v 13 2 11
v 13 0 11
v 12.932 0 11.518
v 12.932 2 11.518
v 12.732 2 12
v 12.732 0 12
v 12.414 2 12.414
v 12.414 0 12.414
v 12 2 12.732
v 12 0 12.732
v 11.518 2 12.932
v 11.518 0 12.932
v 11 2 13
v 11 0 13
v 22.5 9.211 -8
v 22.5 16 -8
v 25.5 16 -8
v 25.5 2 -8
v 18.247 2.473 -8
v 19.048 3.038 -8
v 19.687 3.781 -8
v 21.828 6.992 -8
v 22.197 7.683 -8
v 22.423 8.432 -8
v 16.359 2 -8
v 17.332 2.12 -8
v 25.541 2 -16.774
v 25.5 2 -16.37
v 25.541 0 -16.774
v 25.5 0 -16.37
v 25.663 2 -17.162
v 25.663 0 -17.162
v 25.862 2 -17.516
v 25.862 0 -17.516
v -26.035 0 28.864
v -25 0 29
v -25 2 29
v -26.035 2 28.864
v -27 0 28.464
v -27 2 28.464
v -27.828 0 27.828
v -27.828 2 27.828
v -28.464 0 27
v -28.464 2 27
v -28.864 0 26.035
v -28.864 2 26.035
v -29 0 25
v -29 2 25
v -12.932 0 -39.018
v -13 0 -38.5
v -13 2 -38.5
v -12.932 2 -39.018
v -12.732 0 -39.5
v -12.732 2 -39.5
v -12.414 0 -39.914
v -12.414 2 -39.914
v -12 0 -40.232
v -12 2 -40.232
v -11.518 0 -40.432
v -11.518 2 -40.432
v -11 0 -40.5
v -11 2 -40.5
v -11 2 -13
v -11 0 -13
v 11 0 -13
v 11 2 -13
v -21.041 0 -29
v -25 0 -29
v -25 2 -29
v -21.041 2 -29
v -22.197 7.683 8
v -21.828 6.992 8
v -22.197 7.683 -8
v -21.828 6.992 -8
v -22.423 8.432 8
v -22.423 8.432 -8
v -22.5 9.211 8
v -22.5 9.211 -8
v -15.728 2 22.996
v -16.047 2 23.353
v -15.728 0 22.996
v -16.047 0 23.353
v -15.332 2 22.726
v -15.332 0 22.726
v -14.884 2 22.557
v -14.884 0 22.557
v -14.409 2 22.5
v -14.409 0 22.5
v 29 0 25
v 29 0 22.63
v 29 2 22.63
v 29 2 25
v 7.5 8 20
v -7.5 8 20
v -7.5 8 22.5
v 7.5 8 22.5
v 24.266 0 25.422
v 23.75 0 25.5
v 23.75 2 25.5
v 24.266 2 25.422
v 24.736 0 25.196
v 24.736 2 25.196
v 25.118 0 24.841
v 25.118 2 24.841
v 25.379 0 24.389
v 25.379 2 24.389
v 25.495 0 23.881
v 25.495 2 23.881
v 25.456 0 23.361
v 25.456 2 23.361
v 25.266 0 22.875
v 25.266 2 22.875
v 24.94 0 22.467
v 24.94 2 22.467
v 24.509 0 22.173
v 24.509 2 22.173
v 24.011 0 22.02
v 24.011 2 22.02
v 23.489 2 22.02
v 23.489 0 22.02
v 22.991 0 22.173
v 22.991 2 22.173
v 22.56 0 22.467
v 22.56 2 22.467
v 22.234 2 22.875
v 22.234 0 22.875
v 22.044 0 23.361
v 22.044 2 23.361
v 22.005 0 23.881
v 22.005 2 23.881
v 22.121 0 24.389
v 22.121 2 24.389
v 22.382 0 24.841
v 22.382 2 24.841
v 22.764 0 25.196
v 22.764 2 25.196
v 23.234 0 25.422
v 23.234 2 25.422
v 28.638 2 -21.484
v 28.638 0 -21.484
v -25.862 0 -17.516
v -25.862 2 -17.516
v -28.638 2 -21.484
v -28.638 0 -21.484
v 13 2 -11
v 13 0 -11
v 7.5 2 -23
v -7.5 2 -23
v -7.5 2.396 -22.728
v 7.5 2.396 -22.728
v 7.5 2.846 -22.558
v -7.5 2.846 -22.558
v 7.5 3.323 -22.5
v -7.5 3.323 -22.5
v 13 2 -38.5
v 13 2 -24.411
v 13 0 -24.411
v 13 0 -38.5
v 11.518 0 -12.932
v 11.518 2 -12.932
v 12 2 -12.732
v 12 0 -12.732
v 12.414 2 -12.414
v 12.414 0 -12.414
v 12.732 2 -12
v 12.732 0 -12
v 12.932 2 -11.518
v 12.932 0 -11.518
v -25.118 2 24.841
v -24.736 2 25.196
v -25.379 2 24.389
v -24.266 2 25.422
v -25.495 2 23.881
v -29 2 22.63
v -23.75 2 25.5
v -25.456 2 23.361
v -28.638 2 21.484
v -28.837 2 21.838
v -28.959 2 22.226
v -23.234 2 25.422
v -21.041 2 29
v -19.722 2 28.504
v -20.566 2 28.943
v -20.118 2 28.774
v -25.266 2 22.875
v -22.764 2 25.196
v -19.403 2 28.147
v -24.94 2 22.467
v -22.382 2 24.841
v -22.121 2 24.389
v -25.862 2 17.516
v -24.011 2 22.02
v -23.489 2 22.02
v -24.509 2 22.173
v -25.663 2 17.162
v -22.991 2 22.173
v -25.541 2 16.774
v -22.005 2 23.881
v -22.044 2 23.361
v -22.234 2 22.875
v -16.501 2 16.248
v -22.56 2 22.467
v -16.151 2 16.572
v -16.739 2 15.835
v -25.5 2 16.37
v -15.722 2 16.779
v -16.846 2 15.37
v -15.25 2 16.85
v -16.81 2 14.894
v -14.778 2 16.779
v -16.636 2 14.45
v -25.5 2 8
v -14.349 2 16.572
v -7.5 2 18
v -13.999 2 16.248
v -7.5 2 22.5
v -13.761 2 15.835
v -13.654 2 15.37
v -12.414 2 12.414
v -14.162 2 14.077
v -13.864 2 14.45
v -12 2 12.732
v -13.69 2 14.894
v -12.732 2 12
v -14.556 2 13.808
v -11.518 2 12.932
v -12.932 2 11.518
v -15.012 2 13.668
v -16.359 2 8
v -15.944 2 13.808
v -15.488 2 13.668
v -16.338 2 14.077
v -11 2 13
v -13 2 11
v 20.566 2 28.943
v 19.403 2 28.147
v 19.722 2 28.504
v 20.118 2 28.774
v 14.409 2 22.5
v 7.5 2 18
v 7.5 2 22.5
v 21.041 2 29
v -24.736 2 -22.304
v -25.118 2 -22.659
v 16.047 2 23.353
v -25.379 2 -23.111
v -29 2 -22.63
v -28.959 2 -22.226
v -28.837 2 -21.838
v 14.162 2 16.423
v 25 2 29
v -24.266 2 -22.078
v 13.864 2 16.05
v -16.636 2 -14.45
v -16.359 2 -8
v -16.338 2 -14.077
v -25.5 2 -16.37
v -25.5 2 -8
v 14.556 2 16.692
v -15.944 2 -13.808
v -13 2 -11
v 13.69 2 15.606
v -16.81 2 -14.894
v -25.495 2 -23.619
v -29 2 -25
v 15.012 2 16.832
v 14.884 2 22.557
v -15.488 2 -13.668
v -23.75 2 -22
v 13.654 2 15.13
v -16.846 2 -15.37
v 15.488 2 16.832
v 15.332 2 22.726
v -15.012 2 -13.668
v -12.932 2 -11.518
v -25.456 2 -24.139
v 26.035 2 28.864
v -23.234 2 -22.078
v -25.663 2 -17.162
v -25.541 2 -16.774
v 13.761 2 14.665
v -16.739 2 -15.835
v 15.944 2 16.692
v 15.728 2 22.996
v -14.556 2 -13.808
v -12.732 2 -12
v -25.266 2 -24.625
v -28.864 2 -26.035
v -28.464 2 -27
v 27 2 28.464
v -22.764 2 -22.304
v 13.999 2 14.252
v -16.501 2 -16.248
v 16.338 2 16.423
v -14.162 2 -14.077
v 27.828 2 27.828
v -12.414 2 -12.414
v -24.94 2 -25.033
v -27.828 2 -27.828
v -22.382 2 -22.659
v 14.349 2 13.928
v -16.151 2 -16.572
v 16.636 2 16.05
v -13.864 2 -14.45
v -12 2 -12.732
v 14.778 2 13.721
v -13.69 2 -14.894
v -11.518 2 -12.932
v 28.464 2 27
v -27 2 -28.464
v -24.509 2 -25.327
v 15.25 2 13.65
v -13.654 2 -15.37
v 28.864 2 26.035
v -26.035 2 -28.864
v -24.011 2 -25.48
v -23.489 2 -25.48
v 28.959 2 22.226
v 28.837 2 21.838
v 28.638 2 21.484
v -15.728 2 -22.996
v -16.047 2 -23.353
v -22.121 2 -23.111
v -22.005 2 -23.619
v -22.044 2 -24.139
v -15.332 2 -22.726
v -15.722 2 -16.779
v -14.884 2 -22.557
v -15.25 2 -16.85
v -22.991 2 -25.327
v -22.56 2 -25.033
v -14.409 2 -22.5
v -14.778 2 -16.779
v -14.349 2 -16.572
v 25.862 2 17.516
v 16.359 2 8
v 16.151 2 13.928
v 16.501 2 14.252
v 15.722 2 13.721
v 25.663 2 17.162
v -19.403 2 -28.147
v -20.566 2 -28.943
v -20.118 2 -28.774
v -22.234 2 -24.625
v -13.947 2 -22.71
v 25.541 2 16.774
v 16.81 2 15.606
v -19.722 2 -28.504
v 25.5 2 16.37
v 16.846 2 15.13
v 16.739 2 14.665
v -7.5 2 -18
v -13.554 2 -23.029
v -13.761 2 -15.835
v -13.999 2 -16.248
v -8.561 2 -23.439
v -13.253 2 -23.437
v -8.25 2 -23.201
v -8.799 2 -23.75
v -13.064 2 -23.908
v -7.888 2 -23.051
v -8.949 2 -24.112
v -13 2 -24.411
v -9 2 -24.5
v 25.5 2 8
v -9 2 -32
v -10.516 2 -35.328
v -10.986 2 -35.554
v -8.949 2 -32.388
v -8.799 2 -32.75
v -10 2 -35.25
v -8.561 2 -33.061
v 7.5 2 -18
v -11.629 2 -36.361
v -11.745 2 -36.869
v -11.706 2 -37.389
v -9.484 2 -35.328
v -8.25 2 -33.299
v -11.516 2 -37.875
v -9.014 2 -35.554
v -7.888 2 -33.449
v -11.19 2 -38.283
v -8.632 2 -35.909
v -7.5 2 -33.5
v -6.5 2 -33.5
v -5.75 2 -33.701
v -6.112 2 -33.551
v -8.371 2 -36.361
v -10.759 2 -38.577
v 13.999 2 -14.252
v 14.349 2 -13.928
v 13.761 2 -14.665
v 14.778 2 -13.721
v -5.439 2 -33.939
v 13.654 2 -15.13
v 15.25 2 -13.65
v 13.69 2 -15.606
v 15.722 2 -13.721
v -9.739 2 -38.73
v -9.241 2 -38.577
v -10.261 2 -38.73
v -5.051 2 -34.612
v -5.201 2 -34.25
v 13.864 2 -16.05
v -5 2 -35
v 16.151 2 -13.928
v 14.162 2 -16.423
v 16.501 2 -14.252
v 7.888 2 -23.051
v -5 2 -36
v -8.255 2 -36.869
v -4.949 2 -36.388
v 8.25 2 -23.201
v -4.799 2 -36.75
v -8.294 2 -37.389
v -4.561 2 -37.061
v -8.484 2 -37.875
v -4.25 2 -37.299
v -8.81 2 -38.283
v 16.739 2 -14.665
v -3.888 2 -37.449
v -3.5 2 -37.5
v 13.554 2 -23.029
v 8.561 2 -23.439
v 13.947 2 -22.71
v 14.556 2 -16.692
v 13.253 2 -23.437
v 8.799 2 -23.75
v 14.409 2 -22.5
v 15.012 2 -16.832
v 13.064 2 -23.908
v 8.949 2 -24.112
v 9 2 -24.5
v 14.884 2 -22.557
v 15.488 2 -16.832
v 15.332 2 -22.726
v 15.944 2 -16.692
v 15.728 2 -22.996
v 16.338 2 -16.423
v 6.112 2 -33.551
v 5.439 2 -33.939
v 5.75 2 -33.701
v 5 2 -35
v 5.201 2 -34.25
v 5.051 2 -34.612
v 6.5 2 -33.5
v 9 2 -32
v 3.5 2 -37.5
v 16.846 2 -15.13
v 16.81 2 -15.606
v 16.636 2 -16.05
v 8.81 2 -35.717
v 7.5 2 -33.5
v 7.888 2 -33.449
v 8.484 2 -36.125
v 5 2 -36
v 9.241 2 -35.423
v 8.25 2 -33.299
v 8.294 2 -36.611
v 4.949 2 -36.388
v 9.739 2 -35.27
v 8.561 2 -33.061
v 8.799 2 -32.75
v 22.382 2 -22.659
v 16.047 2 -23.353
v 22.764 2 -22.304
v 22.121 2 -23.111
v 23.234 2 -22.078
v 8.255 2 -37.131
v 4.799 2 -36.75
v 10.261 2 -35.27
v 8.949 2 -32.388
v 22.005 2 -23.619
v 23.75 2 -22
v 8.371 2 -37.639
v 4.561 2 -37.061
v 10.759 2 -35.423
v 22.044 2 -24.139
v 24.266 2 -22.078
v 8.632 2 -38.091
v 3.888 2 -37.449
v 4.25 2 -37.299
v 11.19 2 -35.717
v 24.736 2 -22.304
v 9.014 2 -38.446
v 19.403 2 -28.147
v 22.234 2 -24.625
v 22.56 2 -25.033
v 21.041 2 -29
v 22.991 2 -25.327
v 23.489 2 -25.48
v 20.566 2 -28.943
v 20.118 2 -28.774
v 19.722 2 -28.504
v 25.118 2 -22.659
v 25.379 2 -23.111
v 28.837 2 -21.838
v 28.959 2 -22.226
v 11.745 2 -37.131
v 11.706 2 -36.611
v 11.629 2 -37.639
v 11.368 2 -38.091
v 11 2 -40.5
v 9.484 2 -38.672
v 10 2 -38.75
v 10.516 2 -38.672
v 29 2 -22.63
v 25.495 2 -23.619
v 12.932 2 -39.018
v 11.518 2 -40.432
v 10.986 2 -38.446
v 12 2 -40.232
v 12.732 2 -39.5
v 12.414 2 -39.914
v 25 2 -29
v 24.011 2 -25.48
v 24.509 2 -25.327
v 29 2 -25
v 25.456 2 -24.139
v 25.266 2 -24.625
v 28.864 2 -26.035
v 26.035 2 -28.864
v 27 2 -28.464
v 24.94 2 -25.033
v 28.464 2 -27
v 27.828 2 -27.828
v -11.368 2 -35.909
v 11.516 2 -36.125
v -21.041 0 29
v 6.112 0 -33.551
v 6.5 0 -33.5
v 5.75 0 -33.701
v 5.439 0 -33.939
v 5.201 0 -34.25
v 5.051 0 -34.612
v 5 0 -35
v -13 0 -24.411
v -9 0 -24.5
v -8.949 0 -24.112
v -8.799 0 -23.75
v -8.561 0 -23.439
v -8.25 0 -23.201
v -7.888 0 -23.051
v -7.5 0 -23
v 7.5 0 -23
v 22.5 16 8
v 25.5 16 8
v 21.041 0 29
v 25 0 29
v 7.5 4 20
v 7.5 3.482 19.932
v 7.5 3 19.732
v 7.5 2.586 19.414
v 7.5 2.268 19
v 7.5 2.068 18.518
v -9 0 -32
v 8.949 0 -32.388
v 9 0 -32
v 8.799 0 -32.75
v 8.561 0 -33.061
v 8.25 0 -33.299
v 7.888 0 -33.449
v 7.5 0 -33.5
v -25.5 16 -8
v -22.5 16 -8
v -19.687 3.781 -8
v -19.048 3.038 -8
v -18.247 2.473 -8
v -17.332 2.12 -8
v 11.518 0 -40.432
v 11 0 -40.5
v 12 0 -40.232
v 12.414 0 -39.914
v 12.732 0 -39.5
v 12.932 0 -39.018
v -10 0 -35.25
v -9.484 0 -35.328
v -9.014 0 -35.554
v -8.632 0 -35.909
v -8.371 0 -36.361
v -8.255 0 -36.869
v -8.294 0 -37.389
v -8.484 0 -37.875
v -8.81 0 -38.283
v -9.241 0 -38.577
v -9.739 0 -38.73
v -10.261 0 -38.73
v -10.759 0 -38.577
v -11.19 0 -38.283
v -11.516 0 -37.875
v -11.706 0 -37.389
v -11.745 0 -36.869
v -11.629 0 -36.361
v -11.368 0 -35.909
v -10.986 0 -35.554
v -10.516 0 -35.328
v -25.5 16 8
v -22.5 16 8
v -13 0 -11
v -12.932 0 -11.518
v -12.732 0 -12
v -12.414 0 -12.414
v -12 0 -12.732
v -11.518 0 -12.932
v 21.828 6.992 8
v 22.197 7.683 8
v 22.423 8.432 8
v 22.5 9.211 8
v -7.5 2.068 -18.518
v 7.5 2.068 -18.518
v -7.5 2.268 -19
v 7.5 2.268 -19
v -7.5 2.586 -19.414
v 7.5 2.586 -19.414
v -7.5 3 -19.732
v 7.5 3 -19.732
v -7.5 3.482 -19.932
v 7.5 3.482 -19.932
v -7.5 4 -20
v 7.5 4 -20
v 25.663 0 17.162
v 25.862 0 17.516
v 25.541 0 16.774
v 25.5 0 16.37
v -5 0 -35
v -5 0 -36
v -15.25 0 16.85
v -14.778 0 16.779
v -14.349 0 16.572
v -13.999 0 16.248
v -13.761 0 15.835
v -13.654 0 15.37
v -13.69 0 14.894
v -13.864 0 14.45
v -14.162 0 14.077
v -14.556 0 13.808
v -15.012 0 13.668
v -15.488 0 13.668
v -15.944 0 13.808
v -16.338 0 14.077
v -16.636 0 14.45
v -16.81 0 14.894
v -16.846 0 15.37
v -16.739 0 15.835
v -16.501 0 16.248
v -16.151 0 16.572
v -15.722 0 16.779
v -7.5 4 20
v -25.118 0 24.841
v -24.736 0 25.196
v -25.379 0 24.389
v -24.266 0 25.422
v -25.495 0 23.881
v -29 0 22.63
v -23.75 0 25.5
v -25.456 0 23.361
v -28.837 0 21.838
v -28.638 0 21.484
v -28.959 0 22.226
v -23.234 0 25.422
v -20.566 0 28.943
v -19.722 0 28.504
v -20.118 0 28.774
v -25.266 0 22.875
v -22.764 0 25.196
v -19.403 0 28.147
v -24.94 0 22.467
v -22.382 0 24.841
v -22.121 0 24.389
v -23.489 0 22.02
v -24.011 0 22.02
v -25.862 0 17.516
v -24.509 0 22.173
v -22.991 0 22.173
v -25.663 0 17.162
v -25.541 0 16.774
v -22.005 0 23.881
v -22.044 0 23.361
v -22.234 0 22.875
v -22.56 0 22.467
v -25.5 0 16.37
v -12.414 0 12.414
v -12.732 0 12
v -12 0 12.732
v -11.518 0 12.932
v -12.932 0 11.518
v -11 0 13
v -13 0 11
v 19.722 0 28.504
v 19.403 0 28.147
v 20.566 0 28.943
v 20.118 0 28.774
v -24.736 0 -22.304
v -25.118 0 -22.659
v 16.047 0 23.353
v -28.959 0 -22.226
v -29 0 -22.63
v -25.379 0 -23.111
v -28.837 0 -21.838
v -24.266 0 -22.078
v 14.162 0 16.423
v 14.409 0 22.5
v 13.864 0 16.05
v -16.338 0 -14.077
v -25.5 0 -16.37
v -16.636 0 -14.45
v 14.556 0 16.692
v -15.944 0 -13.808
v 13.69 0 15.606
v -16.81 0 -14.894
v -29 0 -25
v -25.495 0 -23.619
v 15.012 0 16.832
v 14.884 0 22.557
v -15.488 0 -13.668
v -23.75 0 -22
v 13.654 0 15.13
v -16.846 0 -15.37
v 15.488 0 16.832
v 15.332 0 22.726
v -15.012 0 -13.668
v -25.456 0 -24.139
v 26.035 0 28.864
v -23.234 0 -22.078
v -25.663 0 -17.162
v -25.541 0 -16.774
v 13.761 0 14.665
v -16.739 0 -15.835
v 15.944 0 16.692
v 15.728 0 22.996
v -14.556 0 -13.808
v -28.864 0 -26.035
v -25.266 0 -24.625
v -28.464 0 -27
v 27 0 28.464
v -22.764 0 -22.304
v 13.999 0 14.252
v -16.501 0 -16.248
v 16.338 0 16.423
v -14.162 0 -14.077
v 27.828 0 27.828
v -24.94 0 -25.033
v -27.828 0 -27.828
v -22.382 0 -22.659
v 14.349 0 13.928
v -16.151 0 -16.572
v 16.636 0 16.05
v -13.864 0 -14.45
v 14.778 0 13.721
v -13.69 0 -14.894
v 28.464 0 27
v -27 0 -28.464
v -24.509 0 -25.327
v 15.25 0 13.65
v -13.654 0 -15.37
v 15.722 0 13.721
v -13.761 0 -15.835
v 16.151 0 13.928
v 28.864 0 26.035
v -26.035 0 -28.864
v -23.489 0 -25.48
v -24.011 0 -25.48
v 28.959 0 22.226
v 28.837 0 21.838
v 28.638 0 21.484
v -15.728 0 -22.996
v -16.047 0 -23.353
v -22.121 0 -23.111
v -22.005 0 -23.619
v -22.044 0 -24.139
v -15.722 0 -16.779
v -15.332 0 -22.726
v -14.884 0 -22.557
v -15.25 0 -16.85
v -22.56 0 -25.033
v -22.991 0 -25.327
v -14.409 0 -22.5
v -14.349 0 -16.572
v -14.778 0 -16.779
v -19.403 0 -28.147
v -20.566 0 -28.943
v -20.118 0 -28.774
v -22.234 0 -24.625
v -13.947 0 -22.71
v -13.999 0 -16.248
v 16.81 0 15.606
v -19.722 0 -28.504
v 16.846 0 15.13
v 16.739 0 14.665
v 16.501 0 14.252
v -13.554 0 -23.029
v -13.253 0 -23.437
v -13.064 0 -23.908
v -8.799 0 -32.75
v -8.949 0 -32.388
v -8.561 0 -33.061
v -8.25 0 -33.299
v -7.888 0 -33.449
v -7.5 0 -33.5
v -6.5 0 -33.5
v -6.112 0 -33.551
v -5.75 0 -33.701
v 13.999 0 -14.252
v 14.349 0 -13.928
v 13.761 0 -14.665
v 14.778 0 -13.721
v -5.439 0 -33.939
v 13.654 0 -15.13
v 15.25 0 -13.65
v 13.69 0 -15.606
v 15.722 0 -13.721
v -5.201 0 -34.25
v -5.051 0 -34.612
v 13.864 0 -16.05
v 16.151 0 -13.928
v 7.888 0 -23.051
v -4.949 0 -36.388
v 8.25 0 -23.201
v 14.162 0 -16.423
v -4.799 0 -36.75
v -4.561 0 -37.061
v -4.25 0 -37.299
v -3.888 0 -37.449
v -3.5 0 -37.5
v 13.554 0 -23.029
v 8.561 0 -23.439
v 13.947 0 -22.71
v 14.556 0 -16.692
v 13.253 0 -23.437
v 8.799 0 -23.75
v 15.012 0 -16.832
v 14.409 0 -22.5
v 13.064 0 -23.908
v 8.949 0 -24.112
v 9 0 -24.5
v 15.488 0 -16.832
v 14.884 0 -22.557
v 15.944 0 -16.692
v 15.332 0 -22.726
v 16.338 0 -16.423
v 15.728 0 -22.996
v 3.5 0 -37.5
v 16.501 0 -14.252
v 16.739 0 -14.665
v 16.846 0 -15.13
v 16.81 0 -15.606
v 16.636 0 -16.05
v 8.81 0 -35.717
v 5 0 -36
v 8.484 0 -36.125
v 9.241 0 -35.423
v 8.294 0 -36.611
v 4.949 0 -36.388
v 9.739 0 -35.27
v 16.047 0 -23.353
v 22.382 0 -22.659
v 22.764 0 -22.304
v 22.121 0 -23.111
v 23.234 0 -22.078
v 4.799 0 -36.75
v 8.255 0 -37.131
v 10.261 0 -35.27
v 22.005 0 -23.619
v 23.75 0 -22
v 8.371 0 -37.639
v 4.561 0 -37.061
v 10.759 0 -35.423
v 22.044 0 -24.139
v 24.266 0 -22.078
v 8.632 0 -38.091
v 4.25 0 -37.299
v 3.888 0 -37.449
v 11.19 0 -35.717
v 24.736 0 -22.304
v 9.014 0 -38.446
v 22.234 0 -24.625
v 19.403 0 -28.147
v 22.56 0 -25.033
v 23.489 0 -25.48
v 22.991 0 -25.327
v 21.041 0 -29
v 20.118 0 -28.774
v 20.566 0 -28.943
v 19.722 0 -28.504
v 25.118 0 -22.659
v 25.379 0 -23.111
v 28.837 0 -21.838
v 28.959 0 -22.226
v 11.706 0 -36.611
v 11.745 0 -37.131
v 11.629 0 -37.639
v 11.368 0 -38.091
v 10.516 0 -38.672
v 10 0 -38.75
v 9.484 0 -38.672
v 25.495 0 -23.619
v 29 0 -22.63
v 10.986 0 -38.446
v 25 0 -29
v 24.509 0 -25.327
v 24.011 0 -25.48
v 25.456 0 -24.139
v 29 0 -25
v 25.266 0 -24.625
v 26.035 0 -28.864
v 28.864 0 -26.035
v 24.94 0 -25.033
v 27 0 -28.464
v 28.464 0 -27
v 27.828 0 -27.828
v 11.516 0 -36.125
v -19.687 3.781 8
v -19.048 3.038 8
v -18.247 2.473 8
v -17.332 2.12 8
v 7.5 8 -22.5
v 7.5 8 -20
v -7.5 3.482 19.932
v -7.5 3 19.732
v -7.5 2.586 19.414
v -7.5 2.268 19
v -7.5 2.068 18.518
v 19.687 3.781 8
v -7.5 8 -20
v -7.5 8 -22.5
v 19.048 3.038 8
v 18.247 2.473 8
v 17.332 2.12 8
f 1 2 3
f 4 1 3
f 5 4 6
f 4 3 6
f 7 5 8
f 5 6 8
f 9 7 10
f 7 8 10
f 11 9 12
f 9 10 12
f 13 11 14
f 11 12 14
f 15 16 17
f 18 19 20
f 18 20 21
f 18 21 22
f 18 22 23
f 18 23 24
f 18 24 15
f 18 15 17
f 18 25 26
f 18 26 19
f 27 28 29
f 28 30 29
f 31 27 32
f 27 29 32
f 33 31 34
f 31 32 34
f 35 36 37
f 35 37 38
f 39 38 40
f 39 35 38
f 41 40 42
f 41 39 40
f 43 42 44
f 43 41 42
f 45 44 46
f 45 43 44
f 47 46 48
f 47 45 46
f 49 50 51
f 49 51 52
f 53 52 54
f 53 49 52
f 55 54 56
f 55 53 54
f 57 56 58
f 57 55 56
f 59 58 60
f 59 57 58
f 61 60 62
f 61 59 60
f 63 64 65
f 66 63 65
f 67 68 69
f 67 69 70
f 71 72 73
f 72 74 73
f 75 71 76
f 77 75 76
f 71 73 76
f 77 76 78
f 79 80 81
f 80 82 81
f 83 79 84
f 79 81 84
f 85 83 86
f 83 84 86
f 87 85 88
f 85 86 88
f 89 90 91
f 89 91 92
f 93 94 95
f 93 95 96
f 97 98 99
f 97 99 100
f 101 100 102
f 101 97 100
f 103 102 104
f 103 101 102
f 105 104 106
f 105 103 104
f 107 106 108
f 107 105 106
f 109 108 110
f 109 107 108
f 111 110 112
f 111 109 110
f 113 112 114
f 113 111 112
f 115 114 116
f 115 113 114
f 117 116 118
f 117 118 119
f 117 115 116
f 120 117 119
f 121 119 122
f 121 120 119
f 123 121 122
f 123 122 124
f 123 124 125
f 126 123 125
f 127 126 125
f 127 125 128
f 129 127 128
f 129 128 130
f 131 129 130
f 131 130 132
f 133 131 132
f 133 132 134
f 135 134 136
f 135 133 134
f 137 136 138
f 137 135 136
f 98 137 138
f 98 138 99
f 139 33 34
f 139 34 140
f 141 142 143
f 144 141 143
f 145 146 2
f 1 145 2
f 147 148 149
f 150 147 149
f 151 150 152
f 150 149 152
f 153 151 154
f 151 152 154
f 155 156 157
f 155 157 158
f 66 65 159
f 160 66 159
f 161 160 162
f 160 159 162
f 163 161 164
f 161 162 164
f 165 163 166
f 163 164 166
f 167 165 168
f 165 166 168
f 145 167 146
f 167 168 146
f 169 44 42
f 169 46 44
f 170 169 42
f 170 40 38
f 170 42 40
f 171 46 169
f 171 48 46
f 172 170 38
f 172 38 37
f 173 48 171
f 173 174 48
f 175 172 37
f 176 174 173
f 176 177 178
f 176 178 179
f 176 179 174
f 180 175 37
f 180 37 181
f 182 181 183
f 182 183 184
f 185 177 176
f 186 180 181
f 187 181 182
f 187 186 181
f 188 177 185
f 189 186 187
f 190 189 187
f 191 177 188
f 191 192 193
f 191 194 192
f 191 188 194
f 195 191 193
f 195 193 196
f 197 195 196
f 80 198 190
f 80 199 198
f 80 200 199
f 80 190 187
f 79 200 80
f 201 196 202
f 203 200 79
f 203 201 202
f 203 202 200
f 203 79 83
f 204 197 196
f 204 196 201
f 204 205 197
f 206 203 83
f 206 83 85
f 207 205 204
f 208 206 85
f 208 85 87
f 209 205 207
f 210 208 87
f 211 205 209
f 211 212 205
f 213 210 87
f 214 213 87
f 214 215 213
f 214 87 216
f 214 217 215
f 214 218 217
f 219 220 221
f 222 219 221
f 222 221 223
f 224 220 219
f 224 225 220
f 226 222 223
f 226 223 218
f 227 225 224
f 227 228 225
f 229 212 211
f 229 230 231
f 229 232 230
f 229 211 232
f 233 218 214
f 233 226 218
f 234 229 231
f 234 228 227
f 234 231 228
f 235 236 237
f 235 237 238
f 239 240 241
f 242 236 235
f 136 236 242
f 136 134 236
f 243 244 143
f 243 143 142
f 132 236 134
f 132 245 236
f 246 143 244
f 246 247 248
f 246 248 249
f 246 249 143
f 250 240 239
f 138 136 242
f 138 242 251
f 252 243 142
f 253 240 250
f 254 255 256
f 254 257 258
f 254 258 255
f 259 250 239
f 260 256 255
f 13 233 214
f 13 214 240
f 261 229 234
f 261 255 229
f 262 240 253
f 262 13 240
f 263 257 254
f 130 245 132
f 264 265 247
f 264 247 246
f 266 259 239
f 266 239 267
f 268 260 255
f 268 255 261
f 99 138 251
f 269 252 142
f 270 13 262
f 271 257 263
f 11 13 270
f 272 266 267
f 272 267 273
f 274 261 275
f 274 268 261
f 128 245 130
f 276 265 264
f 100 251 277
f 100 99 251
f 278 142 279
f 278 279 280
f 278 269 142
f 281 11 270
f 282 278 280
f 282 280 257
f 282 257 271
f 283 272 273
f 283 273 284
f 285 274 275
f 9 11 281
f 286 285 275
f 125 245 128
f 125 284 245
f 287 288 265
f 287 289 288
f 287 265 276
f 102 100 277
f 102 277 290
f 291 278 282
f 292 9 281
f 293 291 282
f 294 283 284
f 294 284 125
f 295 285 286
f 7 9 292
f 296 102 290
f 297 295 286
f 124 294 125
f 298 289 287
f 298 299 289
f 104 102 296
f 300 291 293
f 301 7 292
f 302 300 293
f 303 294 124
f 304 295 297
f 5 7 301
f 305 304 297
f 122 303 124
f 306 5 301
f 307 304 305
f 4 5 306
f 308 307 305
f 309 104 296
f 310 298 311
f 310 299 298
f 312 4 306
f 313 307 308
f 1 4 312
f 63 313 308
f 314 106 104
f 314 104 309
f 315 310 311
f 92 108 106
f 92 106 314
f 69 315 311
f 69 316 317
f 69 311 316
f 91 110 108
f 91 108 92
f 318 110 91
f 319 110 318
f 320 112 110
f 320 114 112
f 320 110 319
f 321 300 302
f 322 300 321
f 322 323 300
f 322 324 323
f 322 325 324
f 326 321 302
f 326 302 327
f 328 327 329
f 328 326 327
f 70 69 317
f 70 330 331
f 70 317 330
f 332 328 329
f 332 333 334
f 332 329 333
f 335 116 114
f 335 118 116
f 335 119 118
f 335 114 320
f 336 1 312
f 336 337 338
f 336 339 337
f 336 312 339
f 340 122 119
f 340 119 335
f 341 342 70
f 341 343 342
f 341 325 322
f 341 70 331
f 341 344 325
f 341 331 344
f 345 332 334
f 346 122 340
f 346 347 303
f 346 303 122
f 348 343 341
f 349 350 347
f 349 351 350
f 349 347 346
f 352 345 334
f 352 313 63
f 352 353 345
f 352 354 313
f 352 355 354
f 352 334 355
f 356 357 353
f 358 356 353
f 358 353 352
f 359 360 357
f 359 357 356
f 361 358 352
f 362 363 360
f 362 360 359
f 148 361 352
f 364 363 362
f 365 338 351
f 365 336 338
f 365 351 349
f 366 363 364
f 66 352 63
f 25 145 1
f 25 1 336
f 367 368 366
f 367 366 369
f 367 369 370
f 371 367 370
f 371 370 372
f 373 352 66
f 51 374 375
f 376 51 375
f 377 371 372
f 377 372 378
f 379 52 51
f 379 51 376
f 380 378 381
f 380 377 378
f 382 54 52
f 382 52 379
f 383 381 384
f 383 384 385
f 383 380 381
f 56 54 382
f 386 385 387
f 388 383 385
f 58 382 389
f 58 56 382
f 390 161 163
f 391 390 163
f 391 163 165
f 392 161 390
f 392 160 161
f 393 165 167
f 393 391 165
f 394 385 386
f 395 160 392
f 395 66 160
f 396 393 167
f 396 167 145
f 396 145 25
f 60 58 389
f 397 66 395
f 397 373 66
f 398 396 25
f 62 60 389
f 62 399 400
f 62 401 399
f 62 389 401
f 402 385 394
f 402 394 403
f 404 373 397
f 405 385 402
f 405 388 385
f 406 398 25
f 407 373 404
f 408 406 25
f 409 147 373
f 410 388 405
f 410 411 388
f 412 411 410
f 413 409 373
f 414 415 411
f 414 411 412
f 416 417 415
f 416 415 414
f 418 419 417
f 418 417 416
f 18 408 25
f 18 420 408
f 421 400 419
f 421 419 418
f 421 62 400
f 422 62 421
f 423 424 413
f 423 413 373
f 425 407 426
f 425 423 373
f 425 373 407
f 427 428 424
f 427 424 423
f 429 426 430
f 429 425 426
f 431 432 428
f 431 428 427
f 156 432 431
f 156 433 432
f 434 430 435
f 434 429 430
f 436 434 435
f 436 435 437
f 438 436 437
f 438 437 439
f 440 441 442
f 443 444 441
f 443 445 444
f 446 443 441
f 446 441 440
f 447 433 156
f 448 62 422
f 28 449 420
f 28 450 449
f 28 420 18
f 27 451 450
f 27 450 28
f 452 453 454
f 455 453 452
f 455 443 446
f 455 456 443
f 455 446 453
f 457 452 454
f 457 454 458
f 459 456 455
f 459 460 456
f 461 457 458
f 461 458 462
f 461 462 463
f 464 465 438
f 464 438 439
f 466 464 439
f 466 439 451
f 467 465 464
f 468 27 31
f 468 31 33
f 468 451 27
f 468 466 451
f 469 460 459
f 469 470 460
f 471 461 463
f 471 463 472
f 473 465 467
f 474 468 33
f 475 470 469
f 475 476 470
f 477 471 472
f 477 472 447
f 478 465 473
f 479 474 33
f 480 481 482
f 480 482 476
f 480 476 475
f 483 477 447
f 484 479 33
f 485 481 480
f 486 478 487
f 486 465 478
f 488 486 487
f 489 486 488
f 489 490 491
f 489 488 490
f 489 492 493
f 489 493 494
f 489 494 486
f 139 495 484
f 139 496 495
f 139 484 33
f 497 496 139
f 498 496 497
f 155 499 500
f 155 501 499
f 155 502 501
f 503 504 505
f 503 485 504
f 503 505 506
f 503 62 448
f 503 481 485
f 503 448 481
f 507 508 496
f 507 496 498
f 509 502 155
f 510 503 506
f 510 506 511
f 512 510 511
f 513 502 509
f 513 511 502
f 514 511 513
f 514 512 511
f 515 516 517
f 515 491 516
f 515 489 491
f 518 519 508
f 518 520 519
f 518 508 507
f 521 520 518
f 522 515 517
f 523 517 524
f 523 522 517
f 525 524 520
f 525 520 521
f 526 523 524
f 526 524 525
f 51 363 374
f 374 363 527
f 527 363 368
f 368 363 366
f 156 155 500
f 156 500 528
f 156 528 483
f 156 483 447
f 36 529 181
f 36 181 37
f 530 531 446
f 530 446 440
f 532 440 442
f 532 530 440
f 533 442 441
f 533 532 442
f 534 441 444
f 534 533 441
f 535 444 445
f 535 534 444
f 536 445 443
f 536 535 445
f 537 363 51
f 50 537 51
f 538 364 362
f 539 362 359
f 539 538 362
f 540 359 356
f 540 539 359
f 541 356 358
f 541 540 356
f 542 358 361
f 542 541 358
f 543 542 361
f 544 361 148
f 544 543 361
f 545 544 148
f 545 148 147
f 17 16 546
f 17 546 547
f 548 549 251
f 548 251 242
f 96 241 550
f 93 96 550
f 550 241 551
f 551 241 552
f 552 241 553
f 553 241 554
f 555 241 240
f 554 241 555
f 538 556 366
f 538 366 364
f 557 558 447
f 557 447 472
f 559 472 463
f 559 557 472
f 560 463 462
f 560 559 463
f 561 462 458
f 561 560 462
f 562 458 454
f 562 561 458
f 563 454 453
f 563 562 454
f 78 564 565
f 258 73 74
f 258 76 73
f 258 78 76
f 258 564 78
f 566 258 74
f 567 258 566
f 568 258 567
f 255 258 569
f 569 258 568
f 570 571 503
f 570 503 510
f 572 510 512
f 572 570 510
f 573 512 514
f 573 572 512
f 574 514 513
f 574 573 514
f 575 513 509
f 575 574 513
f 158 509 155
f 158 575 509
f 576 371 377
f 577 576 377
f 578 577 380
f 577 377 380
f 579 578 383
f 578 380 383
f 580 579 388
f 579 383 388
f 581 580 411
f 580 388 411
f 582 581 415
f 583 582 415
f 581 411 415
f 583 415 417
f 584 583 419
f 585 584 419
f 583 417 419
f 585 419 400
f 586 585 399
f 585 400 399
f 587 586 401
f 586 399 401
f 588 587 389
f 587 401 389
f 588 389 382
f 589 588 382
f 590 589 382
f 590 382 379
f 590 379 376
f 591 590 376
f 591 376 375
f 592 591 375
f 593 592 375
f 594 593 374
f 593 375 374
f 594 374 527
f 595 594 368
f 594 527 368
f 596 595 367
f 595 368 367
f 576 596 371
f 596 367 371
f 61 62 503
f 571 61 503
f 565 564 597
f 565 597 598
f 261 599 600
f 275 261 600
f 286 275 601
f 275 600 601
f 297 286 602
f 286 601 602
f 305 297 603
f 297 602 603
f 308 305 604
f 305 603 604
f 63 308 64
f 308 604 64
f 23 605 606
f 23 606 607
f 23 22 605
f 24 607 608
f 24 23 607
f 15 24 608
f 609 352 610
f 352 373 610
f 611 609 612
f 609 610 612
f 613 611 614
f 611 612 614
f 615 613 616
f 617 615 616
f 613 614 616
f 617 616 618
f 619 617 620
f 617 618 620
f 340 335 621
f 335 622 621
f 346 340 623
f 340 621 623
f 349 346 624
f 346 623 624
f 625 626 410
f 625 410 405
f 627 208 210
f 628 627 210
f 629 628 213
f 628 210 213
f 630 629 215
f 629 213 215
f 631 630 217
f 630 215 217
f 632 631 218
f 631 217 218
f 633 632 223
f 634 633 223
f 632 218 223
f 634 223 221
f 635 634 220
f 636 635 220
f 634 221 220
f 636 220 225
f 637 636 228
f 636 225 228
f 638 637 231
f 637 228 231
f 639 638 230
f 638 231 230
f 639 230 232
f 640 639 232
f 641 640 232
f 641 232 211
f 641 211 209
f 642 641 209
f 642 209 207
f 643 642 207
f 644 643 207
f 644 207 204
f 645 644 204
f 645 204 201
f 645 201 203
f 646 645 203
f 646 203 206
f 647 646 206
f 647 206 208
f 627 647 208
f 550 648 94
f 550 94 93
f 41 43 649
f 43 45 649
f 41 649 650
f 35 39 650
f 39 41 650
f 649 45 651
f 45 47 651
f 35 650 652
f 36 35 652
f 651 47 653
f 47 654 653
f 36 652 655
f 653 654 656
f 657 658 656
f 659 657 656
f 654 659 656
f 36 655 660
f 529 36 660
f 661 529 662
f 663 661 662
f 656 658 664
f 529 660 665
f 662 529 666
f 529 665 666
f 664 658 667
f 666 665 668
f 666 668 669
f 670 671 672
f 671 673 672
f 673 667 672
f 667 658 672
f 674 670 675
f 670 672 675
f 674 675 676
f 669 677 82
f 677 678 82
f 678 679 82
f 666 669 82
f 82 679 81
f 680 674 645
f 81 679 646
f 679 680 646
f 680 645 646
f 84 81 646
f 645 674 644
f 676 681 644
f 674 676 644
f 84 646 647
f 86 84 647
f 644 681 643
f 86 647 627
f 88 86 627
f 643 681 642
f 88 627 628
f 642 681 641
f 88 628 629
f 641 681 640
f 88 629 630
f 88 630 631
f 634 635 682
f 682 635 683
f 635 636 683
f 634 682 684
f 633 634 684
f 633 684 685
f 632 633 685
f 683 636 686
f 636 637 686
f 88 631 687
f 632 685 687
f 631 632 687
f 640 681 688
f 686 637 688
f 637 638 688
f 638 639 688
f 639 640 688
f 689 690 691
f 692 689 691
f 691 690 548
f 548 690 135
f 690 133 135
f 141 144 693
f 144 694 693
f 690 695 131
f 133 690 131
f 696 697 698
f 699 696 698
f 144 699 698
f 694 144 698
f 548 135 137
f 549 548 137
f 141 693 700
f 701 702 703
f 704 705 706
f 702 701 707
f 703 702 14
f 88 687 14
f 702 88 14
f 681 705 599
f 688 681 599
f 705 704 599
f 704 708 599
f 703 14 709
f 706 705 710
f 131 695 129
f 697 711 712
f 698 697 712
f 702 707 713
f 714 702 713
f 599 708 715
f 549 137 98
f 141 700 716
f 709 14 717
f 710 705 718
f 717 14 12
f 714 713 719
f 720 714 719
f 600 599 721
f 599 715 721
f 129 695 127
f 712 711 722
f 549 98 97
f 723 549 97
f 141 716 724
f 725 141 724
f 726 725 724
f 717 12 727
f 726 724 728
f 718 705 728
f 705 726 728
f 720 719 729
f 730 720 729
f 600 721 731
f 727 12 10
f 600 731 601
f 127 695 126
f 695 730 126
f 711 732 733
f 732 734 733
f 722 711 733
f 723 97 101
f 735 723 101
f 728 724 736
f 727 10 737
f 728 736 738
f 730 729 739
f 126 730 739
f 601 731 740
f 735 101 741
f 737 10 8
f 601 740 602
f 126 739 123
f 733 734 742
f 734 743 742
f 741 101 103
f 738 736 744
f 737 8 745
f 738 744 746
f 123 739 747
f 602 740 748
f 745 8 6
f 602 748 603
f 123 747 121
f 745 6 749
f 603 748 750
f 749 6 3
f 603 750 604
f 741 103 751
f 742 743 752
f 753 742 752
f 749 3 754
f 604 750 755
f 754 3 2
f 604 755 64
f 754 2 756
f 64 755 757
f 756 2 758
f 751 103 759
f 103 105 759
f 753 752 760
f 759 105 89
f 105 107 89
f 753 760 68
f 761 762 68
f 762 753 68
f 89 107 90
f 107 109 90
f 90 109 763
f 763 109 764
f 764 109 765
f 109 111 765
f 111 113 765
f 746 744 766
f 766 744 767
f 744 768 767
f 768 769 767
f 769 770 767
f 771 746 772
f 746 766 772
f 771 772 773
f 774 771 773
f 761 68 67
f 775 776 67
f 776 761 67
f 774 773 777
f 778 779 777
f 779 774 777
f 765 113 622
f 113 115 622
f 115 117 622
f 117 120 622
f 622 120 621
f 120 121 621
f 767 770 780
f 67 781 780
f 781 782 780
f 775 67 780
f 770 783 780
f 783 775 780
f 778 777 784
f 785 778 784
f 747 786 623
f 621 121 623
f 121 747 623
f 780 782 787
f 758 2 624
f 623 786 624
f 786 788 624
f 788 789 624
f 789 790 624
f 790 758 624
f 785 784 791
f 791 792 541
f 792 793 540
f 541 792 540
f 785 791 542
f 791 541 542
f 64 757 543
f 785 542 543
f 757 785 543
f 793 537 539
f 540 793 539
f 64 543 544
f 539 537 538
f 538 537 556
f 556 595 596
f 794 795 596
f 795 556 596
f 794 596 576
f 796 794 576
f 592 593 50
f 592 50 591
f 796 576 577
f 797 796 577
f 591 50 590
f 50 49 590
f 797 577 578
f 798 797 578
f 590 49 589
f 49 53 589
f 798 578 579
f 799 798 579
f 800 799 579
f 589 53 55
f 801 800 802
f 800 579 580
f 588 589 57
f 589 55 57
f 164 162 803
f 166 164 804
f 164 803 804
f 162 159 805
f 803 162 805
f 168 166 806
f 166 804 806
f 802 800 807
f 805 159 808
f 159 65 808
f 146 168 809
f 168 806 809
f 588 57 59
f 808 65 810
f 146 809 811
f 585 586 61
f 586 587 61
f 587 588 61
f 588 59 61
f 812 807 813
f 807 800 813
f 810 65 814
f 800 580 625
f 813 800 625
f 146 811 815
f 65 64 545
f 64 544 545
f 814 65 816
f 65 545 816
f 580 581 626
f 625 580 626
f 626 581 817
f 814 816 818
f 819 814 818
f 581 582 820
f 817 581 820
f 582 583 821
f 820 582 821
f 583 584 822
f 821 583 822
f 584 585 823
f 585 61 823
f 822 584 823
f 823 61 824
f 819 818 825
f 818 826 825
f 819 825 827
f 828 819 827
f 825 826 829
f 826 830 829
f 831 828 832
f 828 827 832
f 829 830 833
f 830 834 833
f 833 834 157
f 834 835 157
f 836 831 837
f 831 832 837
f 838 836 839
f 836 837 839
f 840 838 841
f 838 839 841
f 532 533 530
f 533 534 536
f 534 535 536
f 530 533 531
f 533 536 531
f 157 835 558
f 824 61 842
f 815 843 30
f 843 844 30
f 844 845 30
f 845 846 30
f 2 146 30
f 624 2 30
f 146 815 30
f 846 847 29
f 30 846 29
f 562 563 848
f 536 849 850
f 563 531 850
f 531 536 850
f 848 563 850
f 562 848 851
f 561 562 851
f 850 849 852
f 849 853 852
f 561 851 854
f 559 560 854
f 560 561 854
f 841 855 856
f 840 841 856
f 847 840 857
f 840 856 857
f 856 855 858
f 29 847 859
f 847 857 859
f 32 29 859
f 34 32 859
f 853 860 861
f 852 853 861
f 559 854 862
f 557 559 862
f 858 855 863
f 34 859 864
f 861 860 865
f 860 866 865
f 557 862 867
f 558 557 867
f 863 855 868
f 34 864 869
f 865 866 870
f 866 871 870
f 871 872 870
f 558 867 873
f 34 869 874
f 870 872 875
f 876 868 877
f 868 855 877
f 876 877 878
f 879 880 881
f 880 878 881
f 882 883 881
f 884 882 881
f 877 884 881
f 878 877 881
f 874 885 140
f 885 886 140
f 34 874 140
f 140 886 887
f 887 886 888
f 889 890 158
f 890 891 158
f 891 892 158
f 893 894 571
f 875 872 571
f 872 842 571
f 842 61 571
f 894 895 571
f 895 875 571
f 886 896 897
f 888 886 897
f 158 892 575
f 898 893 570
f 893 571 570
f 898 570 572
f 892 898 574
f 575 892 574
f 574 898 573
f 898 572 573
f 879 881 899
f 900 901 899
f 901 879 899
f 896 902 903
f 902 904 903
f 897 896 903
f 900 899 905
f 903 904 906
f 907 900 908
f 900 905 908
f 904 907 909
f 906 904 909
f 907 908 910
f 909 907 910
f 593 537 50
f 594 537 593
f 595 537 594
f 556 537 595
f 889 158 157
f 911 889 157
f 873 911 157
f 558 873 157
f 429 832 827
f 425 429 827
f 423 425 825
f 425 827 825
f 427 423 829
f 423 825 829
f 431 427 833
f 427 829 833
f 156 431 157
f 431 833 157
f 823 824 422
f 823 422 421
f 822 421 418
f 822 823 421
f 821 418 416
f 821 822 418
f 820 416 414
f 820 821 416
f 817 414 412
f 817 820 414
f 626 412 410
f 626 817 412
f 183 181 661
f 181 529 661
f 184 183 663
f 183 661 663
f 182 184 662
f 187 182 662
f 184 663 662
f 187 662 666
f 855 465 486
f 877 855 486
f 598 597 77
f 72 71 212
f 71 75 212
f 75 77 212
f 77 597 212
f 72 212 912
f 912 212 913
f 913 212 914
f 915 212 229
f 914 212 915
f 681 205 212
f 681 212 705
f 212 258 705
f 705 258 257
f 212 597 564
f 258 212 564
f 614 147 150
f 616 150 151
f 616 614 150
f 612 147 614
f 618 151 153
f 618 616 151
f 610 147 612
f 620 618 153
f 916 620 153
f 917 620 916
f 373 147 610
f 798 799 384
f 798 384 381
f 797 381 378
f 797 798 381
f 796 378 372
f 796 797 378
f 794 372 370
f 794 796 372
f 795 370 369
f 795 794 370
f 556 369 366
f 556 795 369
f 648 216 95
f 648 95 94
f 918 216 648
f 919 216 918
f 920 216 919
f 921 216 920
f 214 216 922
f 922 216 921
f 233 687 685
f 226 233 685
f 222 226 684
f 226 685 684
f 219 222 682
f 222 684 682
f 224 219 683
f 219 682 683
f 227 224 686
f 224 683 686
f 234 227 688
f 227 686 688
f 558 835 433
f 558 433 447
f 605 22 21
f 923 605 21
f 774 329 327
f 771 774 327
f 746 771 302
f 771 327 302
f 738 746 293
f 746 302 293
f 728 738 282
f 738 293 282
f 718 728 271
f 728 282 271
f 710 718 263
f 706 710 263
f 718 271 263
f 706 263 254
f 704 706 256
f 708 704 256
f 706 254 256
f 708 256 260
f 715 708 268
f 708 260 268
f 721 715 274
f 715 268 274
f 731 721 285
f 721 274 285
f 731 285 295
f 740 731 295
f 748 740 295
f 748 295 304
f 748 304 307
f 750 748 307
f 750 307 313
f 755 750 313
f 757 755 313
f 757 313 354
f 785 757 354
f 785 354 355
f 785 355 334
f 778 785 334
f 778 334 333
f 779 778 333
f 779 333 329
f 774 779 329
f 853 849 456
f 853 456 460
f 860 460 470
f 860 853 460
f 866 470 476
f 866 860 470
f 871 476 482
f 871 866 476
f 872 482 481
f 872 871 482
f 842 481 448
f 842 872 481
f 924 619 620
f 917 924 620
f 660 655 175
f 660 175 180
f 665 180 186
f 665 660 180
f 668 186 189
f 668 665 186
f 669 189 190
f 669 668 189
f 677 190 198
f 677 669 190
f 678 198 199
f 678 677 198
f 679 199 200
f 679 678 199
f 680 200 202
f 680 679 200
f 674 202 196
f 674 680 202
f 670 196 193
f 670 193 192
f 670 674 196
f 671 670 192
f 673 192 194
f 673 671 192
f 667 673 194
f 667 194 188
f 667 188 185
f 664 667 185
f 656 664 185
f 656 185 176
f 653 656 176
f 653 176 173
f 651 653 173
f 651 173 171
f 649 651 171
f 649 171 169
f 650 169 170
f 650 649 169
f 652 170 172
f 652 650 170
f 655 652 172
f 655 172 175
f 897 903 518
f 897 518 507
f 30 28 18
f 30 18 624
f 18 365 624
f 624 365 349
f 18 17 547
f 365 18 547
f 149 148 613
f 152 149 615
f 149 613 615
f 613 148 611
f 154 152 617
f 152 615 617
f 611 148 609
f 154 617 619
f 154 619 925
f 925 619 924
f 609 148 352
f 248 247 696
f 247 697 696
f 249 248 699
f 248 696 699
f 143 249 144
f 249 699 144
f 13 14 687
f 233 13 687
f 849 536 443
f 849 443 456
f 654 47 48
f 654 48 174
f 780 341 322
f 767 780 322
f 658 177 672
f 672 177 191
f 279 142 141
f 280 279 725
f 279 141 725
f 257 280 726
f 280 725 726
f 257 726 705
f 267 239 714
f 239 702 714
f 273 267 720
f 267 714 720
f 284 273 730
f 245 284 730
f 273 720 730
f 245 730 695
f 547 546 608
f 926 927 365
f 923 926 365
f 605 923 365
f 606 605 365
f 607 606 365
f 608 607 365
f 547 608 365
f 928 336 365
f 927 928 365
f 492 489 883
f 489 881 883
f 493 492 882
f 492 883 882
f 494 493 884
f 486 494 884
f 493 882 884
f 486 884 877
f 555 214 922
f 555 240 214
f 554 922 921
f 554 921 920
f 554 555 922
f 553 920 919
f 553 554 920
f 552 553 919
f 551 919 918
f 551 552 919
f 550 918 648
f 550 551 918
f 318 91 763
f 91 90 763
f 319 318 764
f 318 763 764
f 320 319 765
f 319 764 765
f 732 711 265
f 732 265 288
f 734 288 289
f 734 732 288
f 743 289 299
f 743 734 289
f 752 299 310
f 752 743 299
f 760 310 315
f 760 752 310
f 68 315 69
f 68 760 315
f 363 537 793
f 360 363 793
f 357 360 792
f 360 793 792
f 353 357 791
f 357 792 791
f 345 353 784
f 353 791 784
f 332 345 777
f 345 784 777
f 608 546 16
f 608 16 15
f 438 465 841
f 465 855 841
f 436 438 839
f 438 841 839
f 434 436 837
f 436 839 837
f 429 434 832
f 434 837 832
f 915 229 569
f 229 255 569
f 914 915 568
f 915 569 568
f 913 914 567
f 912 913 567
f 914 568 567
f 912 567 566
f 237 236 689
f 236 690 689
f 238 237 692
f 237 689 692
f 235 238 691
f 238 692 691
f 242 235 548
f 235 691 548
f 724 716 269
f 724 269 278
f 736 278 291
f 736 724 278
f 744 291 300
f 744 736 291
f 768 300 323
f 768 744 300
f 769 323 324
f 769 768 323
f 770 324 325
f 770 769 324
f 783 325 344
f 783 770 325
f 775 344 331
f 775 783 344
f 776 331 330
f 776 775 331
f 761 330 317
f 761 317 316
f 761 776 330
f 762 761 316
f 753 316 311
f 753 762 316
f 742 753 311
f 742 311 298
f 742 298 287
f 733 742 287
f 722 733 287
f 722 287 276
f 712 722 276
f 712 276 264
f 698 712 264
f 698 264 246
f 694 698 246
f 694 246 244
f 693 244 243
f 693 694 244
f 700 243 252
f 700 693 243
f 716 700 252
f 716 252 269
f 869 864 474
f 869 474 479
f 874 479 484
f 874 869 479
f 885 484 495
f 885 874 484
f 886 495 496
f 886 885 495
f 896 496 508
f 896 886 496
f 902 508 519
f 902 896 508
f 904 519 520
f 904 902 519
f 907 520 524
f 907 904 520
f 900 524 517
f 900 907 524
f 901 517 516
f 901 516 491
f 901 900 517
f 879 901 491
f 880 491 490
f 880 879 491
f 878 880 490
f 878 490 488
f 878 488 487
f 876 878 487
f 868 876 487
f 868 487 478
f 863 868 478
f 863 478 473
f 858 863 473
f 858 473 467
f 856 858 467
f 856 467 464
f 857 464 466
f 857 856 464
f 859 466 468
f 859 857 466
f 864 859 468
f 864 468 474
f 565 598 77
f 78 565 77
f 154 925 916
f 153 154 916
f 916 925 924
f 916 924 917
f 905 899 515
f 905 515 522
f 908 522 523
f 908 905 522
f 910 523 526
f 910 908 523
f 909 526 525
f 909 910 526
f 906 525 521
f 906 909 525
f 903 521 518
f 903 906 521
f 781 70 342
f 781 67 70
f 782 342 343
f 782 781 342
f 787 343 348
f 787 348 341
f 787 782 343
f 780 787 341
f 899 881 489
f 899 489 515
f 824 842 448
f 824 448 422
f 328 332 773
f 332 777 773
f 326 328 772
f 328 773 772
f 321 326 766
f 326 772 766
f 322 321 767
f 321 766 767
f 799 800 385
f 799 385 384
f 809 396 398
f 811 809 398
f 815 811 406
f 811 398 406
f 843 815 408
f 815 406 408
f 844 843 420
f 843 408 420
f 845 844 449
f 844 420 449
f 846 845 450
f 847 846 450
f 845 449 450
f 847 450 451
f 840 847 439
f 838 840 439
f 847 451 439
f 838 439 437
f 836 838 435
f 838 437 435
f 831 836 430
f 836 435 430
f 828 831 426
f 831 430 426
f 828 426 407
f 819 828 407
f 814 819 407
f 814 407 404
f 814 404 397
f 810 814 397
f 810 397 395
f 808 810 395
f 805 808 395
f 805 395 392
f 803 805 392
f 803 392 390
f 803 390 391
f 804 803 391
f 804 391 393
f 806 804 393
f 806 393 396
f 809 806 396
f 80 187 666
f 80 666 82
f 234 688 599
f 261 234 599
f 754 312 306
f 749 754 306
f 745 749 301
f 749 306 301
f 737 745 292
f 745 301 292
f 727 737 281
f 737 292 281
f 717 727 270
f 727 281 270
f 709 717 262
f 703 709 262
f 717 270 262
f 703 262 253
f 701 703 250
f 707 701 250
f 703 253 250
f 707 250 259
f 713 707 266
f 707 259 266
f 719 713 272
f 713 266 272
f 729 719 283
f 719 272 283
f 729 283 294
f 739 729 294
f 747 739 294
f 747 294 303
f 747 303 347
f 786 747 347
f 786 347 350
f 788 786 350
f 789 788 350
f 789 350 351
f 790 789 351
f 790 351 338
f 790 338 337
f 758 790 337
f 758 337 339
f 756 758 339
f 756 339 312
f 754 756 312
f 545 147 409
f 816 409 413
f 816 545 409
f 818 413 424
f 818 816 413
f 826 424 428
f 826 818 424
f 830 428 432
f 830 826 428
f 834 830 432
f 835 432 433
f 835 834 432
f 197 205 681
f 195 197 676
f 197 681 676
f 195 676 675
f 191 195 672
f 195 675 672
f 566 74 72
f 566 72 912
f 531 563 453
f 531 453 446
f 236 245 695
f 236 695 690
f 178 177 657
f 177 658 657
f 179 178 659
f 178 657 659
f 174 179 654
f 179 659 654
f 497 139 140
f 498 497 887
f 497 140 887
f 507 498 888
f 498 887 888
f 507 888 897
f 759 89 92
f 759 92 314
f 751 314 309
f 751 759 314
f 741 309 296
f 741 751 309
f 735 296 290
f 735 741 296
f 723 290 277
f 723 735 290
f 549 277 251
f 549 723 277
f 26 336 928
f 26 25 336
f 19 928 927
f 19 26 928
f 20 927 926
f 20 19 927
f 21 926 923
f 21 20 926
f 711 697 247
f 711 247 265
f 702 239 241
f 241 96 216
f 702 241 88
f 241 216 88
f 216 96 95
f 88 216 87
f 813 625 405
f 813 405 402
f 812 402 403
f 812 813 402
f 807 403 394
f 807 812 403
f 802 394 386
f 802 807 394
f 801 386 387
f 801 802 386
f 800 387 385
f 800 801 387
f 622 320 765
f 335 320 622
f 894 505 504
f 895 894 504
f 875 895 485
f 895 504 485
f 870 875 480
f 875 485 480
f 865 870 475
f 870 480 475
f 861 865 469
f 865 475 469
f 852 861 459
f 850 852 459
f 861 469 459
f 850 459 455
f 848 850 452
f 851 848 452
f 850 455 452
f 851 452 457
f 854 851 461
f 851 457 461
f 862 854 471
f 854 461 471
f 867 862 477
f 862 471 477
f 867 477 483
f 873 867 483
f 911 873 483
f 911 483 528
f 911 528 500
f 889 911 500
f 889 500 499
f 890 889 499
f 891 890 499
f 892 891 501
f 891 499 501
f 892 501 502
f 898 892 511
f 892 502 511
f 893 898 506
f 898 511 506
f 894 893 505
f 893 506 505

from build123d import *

# Parameters (mm, degrees)
SKETCH1_R                 = 1.75
BASE_DEPTH                = 2
SKETCH2_W                 = 7
SKETCH2_H                 = 16
SIDE_BATTERY_GUIDES_DEPTH = 14
CUT_EXTRUDE1_DEPTH        = 50.658836072
SKETCH5_W                 = 15
SKETCH5_H                 = 2.5
BOSS_EXTRUDE3_DEPTH       = 6
CUT_EXTRUDE2_DEPTH        = 44.33589736
FILLET2_R                 = 2
SKETCH7_R                 = 1.6
CUT_EXTRUDE3_DEPTH        = 44.33589736
SKETCH8_W                 = 26
SKETCH8_H                 = 18
SKETCH8_R                 = 1.75
PINOUT_BD_HOLDER_DEPTH    = 2
WEIGH_REDUCER_DEPTH       = 53.318734694
FILLET3_R                 = 4
FILLET4_R                 = 2
FILLET5_DEPTH             = 2
FILLET5_START             = -7.5
FILLET5_2_DEPTH           = 15
FILLET5_START_2           = -1
FILLET5_3_DEPTH           = 4


with BuildPart() as part:
    # Sketch1 → base (new body)
    with BuildSketch(Plane(origin=(0, 0, 0), x_dir=(1, 0, 0), z_dir=(0, 1, 0))):
        with BuildLine():
            Line((-25, 29), (25, 29))
            ThreePointArc((25, 29), (27.828427125, 27.828427125), (29, 25))
            Line((29, 25), (29, -25))
            ThreePointArc((29, -25), (27.828427125, -27.828427125), (25, -29))
            Line((25, -29), (-25, -29))
            ThreePointArc((-25, -29), (-27.828427125, -27.828427125), (-29, -25))
            Line((-29, -25), (-29, 25))
            ThreePointArc((-29, 25), (-27.828427125, 27.828427125), (-25, 29))
        make_face()
        with Locations(Location((23.75, 23.75, 0), (0, 0, 270))):
            Circle(SKETCH1_R, mode=Mode.SUBTRACT)
        with Locations(Location((23.75, -23.75, 0), (0, 0, 270))):
            Circle(SKETCH1_R, mode=Mode.SUBTRACT)
        with Locations(Location((-23.75, -23.75, 0), (0, 0, 270))):
            Circle(SKETCH1_R, mode=Mode.SUBTRACT)
        with Locations(Location((-23.75, 23.75, 0), (0, 0, 270))):
            Circle(SKETCH1_R, mode=Mode.SUBTRACT)
        with BuildLine():
            Line((-11, 13), (11, 13))
            ThreePointArc((11, 13), (12.414213562, 12.414213562), (13, 11))
            Line((13, 11), (13, -11))
            ThreePointArc((13, -11), (12.414213562, -12.414213562), (11, -13))
            Line((11, -13), (-11, -13))
            ThreePointArc((-11, -13), (-12.414213562, -12.414213562), (-13, -11))
            Line((-13, -11), (-13, 11))
            ThreePointArc((-13, 11), (-12.414213562, 12.414213562), (-11, 13))
        make_face(mode=Mode.SUBTRACT)
    extrude(amount=BASE_DEPTH)

    # Sketch2 → side battery guides (add)
    with BuildSketch(Plane(origin=(0, 2, 0), x_dir=(1, 0, 0), z_dir=(0, 1, 0))):
        with Locations((-22, 0)):
            Rectangle(SKETCH2_W, SKETCH2_H)
        with Locations((22, 0)):
            Rectangle(SKETCH2_W, SKETCH2_H)
    extrude(amount=SIDE_BATTERY_GUIDES_DEPTH)

    # Sketch4 → Cut-Extrude1 (cut, through all)
    with BuildSketch(Plane.XY.offset(8)):
        Polygon((-18.5, 16), (-22.5, 16), (-22.5, 8), (-18.5, 2), align=None)
        Polygon((18.5, 2), (18.5, 16), (22.5, 16), (22.5, 8), align=None)
    extrude(amount=-CUT_EXTRUDE1_DEPTH, mode=Mode.SUBTRACT)

    # Sketch5 → Boss-Extrude3 (add)
    with BuildSketch(Plane(origin=(0, 2, 0), x_dir=(1, 0, 0), z_dir=(0, 1, 0))):
        with Locations((0, 21.25)):
            Rectangle(SKETCH5_W, SKETCH5_H)
        with Locations((0, -21.25)):
            Rectangle(SKETCH5_W, SKETCH5_H)
    extrude(amount=BOSS_EXTRUDE3_DEPTH)

    # Sketch6 → Cut-Extrude2 (cut, through all)
    with BuildSketch(Plane(origin=(0, 2, 0), x_dir=(1, 0, 0), z_dir=(0, 1, 0))):
        Polygon((-25.5, 8), (-25.5, 17), (-29, 22), (-29, -22), (-25.5, -17), (-25.5, -8), align=None)
        Polygon((-15.45, -22.5), (-7.5, -22.5), (7.5, -22.5), (15.45, -22.5), (20, -29), (-20, -29), align=None)
        Polygon((29, 22), (29, -22), (25.5, -17), (25.5, -8), (25.5, 8), (25.5, 17), align=None)
        Polygon((-7.5, 22.5), (7.5, 22.5), (15.45, 22.5), (20, 29), (-20, 29), (-15.45, 22.5), align=None)
    extrude(amount=-CUT_EXTRUDE2_DEPTH, mode=Mode.SUBTRACT)

    # Fillet2
    fillet2_edges = [part.edges().sort_by_distance(p)[0] for p in [
        (-25.5, 1, -17),
        (-25.5, 1, 17),
        (-29, 1, 22),
        (-29, 1, -22),
        (-20, 1, 29),
        (-15.45, 1, 22.5),
        (15.45, 1, 22.5),
        (20, 1, 29),
        (25.5, 1, -17),
        (29, 1, -22),
        (29, 1, 22),
        (25.5, 1, 17),
        (-15.45, 1, -22.5),
        (-20, 1, -29),
        (20, 1, -29),
        (15.45, 1, -22.5),
    ]]
    fillet(fillet2_edges, radius=FILLET2_R)

    # Sketch7 → Cut-Extrude3 (cut, through all)
    with BuildSketch(Plane(origin=(0, 2, 0), x_dir=(1, 0, 0), z_dir=(0, 1, 0))):
        with Locations(Location((15.25, 15.25, 0), (0, 0, 270))):
            Circle(SKETCH7_R)
        with Locations(Location((15.25, -15.25, 0), (0, 0, 90))):
            Circle(SKETCH7_R)
        with Locations(Location((-15.25, -15.25, 0), (0, 0, 270))):
            Circle(SKETCH7_R)
        with Locations(Location((-15.25, 15.25, 0), (0, 0, 90))):
            Circle(SKETCH7_R)
    extrude(amount=-CUT_EXTRUDE3_DEPTH, mode=Mode.SUBTRACT)

    # Sketch8 → pinout_bd_holder (add)
    with BuildSketch(Plane(origin=(0, 2, 0), x_dir=(1, 0, 0), z_dir=(0, 1, 0))):
        with Locations((0, 31.5)):
            Rectangle(SKETCH8_W, SKETCH8_H)
        with Locations(Location((-10, 37, 0), (0, 0, 270))):
            Circle(SKETCH8_R, mode=Mode.SUBTRACT)
        with Locations(Location((10, 37, 0), (0, 0, 90))):
            Circle(SKETCH8_R, mode=Mode.SUBTRACT)
    extrude(amount=-PINOUT_BD_HOLDER_DEPTH)

    # Sketch9 → Weigh-Reducer (cut, through all)
    with BuildSketch(Plane.XZ):
        with BuildLine():
            Line((-7.5, -23), (7.5, -23))
            ThreePointArc((7.5, -23), (8.560660172, -23.439339828), (9, -24.5))
            Line((9, -24.5), (9, -32))
            ThreePointArc((9, -32), (8.560660172, -33.060660172), (7.5, -33.5))
            Line((7.5, -33.5), (6.5, -33.5))
            ThreePointArc((6.5, -33.5), (5.439339828, -33.939339828), (5, -35))
            Line((5, -35), (5, -36))
            ThreePointArc((5, -36), (4.560660172, -37.060660172), (3.5, -37.5))
            Line((3.5, -37.5), (-3.5, -37.5))
            ThreePointArc((-3.5, -37.5), (-4.560660172, -37.060660172), (-5, -36))
            Line((-5, -36), (-5, -35))
            ThreePointArc((-5, -35), (-5.439339828, -33.939339828), (-6.5, -33.5))
            Line((-6.5, -33.5), (-7.5, -33.5))
            ThreePointArc((-7.5, -33.5), (-8.560660172, -33.060660172), (-9, -32))
            Line((-9, -32), (-9, -24.5))
            ThreePointArc((-9, -24.5), (-8.560660172, -23.439339828), (-7.5, -23))
        make_face()
    extrude(amount=-WEIGH_REDUCER_DEPTH, mode=Mode.SUBTRACT)

    # Fillet3
    fillet3_edges = [part.edges().sort_by_distance(p)[0] for p in [
        (22.5, 8, 0),
        (-18.5, 2, 0),
        (18.5, 2, 0),
        (-22.5, 8, 0),
    ]]
    fillet(fillet3_edges, radius=FILLET3_R)

    # Fillet4
    fillet4_edges = [part.edges().sort_by_distance(p)[0] for p in [
        (0, 2, -20),
        (0, 2, 20),
    ]]
    fillet(fillet4_edges, radius=FILLET4_R)

    # Fillet5: read off the stored shape, not the designer's step
    # Fillet5 outline → Fillet5 (add)
    with BuildSketch(Plane(origin=(0, 0, 0), x_dir=(1, 0, 0), z_dir=(0, 1, 0))):
        with BuildLine():
            Line((-13, 22.5), (-13, 24.410589217))
            ThreePointArc((-13, 24.410589217), (-13.390245011, 23.223707219), (-14.408688877, 22.5))
            Line((-14.408688877, 22.5), (-13, 22.5))
        make_face()
        with BuildLine():
            ThreePointArc((14.408688877, 22.5), (13.390245011, 23.223707219), (13, 24.410589217))
            Line((13, 24.410589217), (13, 22.5))
            Line((13, 22.5), (14.408688877, 22.5))
        make_face()
    extrude(amount=FILLET5_DEPTH)

    # Fillet5 2 outline → Fillet5 2 (add)
    with BuildSketch(Plane.YZ.offset(FILLET5_START)):
        with BuildLine():
            ThreePointArc((2, -23), (2.615768875, -22.629171307), (3.322875656, -22.5))
            Line((3.322875656, -22.5), (2, -22.5))
            Line((2, -22.5), (2, -23))
        make_face()
    extrude(amount=FILLET5_2_DEPTH)

    # Fillet5 3 outline → Fillet5 3 (cut)
    with BuildSketch(Plane(origin=(0, 0, 0), x_dir=(1, 0, 0), z_dir=(0, 1, 0)).offset(FILLET5_START_2)):
        with BuildLine():
            ThreePointArc((-13, 38.5), (-12.414213562, 39.914213562), (-11, 40.5))
            Line((-11, 40.5), (-13, 40.5))
            Line((-13, 40.5), (-13, 38.5))
        make_face()
        with BuildLine():
            ThreePointArc((11, 40.5), (12.414213562, 39.914213562), (13, 38.5))
            Line((13, 38.5), (13, 40.5))
            Line((13, 40.5), (11, 40.5))
        make_face()
    extrude(amount=FILLET5_3_DEPTH, mode=Mode.SUBTRACT)


solid = part.part
